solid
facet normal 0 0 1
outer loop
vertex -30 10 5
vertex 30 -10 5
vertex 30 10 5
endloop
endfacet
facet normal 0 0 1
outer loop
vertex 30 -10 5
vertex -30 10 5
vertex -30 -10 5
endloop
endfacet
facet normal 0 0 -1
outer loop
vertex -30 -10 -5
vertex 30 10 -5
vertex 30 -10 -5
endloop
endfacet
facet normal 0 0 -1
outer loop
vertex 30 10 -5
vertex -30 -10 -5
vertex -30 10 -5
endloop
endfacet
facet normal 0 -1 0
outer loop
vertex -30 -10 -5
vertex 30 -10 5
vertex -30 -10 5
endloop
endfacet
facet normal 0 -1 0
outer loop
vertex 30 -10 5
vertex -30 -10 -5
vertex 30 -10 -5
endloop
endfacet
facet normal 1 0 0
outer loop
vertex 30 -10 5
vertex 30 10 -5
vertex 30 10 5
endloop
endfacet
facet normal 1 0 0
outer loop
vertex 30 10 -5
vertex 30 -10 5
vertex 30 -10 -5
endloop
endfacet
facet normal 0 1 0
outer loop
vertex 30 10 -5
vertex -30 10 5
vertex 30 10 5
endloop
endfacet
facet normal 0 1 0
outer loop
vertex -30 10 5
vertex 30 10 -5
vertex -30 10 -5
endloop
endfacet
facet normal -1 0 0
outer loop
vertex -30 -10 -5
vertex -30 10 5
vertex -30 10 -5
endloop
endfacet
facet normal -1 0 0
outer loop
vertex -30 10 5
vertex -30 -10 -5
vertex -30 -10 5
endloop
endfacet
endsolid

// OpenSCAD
module body(base_height=10, top_height=14, base_length=60, top_length=30, width=20, top_offset=5, top) {
    // Car body base 
    cube([base_length,width,base_height],center=true); 
    // Car body top
    if (top) {
        translate([top_offset,0,base_height/2+top_height/2])
            cube([top_length,width,top_height],center=true);
    }
}
$fa = 1;
$fs = 0.4;
body(top=false);
